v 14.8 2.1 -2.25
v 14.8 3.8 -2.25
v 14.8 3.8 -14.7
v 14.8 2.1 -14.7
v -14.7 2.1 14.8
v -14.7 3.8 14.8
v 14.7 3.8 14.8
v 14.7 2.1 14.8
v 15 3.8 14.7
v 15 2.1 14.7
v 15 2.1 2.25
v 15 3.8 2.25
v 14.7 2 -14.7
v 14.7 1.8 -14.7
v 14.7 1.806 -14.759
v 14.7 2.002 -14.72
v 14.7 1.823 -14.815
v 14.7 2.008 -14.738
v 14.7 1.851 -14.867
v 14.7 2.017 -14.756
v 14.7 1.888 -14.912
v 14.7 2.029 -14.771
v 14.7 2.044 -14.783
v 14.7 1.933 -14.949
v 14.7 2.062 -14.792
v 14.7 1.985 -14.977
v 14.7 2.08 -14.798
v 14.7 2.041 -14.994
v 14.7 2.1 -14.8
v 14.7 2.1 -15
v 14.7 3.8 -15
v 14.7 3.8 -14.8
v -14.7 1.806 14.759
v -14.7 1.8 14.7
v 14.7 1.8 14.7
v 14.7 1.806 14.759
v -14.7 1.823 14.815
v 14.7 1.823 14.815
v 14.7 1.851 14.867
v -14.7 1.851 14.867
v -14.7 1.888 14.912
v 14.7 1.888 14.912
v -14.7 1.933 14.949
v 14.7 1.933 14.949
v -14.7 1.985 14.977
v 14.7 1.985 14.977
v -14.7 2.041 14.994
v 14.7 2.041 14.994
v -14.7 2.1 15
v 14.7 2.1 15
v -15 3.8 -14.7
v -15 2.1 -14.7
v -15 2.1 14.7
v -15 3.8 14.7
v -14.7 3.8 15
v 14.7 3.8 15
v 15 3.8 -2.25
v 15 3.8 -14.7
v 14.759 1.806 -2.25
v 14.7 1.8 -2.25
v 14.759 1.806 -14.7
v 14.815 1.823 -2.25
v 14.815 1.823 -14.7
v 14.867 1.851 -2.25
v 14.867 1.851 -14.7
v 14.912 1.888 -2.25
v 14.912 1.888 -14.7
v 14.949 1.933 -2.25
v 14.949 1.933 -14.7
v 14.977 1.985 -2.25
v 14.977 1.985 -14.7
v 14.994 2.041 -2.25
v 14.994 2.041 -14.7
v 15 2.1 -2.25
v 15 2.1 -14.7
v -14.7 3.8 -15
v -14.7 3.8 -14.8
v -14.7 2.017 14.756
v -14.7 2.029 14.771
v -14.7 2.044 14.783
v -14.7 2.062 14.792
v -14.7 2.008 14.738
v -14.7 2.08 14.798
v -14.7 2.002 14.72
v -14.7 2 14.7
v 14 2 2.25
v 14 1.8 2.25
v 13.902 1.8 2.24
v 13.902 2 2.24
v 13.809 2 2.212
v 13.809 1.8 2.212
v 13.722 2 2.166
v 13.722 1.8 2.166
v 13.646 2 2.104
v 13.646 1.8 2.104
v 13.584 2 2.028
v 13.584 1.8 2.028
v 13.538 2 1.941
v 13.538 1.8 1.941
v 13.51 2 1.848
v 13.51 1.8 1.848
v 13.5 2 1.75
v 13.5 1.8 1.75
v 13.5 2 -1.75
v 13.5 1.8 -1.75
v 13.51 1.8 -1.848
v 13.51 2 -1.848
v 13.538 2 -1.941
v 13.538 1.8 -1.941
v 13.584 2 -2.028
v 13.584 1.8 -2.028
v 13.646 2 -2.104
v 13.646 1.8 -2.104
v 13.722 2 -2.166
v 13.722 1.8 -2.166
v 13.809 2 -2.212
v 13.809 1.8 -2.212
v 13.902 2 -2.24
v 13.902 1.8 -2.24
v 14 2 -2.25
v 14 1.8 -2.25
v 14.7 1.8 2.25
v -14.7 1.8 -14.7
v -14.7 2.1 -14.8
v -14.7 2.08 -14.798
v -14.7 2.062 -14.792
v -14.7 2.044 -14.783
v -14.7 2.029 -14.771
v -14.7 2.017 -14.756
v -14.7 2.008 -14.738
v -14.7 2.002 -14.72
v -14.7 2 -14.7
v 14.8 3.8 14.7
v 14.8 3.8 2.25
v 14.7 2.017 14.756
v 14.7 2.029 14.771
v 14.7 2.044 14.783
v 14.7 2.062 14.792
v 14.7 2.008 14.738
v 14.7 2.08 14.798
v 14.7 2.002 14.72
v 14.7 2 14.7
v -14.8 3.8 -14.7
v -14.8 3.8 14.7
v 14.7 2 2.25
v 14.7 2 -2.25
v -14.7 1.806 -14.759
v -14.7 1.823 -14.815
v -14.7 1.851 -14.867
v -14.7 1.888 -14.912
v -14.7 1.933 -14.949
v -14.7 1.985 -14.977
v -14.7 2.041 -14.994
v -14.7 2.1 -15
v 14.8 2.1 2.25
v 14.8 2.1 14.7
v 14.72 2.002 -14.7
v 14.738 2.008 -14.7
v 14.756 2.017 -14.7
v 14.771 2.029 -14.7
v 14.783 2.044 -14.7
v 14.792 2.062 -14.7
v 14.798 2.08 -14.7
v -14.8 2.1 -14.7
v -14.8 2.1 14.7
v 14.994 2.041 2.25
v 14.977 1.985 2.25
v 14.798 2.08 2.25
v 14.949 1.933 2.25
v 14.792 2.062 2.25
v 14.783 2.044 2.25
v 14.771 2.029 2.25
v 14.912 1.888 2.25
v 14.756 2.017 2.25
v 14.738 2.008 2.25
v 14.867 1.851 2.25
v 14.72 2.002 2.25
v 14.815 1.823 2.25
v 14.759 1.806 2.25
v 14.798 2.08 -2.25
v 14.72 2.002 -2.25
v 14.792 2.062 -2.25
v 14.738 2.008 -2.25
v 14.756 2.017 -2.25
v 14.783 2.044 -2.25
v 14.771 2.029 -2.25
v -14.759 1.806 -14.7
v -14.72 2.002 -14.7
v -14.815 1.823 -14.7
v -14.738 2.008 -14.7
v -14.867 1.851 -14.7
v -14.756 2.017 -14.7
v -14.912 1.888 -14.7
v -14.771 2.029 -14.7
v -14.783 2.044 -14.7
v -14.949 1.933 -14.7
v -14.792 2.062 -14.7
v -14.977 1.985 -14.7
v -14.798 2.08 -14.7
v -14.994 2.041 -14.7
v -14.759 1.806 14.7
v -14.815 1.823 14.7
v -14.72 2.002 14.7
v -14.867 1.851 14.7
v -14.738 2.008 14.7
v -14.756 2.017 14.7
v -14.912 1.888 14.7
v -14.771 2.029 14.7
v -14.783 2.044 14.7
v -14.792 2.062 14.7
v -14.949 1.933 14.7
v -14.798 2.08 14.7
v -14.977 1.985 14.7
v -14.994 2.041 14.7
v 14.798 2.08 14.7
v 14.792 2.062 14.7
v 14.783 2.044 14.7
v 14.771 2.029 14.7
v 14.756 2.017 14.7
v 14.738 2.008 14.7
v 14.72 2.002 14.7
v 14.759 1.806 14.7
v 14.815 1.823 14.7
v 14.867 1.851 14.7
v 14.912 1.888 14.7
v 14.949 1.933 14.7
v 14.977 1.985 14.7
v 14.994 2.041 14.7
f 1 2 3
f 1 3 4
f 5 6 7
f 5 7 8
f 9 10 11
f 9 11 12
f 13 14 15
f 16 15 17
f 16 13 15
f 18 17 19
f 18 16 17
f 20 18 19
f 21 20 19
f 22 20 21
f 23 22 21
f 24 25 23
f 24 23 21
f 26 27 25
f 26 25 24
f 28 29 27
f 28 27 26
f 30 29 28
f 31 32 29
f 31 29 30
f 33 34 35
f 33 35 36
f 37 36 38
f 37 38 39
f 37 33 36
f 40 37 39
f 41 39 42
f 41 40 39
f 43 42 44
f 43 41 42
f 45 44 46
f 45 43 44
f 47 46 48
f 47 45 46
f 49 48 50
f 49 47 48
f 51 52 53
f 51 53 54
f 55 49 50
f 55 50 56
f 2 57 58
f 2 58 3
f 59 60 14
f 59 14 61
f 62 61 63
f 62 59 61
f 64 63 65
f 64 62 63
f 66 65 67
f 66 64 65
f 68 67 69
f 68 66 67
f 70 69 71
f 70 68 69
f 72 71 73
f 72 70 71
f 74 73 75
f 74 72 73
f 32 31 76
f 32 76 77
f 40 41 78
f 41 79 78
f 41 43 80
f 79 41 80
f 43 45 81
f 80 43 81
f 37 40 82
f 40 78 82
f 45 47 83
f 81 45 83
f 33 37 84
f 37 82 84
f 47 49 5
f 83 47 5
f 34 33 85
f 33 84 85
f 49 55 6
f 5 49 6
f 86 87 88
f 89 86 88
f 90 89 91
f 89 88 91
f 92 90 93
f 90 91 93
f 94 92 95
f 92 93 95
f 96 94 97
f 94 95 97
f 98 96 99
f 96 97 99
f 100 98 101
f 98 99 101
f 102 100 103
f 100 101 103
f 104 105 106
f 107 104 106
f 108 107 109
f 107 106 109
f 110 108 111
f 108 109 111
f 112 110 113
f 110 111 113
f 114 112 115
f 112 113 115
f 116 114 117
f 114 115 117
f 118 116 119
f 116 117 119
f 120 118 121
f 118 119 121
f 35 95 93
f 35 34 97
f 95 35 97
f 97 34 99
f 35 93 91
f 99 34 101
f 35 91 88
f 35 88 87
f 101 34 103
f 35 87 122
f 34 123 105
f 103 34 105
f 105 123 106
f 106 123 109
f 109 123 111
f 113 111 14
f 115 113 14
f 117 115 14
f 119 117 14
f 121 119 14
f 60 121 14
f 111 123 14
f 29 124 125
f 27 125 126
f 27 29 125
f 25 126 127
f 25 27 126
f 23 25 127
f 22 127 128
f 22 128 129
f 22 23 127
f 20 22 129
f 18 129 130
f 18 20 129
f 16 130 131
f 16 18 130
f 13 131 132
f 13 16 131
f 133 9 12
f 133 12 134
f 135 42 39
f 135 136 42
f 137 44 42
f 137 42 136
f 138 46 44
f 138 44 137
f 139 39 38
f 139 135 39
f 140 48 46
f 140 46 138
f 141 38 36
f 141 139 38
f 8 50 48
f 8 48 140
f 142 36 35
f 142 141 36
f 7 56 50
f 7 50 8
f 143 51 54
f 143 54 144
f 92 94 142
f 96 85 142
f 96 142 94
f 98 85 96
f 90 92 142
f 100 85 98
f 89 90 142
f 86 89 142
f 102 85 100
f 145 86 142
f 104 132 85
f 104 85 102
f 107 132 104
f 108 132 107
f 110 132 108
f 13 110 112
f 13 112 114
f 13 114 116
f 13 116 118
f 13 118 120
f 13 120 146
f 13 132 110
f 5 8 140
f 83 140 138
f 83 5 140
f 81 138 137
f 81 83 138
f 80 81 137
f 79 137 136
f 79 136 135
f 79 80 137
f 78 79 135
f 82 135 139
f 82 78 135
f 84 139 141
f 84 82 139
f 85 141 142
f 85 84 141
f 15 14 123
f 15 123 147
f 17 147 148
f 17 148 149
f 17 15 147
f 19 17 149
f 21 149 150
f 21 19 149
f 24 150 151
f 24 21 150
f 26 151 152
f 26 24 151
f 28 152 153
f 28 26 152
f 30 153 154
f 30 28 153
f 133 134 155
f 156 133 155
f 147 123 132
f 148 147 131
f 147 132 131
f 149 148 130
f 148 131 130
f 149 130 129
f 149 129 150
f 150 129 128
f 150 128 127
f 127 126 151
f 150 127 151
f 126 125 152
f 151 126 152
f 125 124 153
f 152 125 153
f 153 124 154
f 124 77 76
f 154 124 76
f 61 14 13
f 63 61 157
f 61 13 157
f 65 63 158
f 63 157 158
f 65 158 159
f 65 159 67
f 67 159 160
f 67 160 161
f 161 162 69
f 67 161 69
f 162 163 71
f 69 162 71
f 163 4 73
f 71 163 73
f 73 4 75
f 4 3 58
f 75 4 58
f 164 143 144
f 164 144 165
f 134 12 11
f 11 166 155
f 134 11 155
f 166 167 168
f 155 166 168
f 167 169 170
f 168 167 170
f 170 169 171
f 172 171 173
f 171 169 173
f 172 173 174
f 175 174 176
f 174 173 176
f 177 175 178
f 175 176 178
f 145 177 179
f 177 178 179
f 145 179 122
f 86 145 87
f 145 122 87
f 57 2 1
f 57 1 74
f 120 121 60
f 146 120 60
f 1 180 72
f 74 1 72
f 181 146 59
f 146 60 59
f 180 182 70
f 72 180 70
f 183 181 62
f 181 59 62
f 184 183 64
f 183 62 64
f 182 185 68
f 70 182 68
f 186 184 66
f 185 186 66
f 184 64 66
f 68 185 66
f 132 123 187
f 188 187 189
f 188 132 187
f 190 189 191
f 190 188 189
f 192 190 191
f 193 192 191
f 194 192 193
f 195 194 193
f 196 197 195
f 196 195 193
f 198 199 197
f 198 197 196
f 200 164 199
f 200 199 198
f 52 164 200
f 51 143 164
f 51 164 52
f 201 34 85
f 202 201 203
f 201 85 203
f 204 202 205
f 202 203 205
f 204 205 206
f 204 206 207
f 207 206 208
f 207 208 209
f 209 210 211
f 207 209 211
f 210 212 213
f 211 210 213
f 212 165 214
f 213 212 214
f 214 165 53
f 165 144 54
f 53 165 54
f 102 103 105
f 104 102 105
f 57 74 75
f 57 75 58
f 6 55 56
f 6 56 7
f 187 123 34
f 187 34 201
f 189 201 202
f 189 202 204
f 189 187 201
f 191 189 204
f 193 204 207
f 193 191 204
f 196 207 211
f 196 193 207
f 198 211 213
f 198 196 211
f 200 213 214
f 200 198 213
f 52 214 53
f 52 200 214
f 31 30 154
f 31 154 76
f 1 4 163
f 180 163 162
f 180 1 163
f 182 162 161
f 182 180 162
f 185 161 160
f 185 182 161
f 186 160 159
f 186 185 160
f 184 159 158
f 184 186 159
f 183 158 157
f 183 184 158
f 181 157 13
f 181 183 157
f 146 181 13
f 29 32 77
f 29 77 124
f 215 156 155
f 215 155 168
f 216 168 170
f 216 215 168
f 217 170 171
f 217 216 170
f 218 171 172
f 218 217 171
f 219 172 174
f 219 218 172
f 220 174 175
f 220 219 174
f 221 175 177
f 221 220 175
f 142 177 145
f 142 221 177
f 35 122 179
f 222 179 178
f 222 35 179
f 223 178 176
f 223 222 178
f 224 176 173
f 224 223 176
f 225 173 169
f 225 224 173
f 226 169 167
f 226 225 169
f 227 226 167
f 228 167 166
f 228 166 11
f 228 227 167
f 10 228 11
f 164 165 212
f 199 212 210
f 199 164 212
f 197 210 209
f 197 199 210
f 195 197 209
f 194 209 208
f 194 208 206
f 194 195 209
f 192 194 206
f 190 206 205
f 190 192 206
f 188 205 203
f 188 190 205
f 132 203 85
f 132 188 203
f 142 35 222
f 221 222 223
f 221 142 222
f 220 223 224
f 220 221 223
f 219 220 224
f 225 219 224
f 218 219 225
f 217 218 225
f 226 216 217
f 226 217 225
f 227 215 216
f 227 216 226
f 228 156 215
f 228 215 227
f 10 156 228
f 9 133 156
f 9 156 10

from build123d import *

# Parameters (mm, degrees)
BASES_W            = 29.4
BASES_H            = 29.4
BASE_DEPTH         = 0.2
EDGE_FLANGE1_DEPTH = 29.4
EDGE_FLANGE2_DEPTH = 29.4
EDGE_FLANGE3_DEPTH = 29.4
EDGE_FLANGE4_DEPTH = 29.4
VENT_DEPTH         = 42.363026969
VENT_DEPTH_BACK    = 42.363026969


# Sheet-metal steps are written as plain solids
with BuildPart() as part:
    # BaseS → Base (new body)
    with BuildSketch(Plane(origin=(0, 2, 0), x_dir=(1, 0, 0), z_dir=(0, 1, 0))):
        Rectangle(BASES_W, BASES_H)
    extrude(amount=-BASE_DEPTH)

    # Edge-Flange1 section (across the edge) → Edge-Flange1 (add)
    with BuildSketch(Plane(origin=(-14.7, 2, 14.8), x_dir=(0, 0, -1), z_dir=(1, 0, 0))):
        with BuildLine():
            Line((-0.2, 0.1), (-0.2, 1.8))
            Line((-0.2, 1.8), (0, 1.8))
            Line((0, 1.8), (0, 0.1))
            ThreePointArc((0, 0.1), (0.029289322, 0.029289322), (0.1, 0))
            Line((0.1, 0), (0.1, -0.2))
            ThreePointArc((0.1, -0.2), (-0.112132034, -0.112132034), (-0.2, 0.1))
        make_face()
    extrude(amount=EDGE_FLANGE1_DEPTH)

    # Edge-Flange2 section (across the edge) → Edge-Flange2 (add)
    with BuildSketch(Plane(origin=(14.7, 2, -14.8), x_dir=(0, 0, 1), z_dir=(-1, 0, 0))):
        with BuildLine():
            Line((-0.2, 0.1), (-0.2, 1.8))
            Line((-0.2, 1.8), (0, 1.8))
            Line((0, 1.8), (0, 0.1))
            ThreePointArc((0, 0.1), (0.029289322, 0.029289322), (0.1, 0))
            Line((0.1, 0), (0.1, -0.2))
            ThreePointArc((0.1, -0.2), (-0.112132034, -0.112132034), (-0.2, 0.1))
        make_face()
    extrude(amount=EDGE_FLANGE2_DEPTH)

    # Edge-Flange3 section (across the edge) → Edge-Flange3 (add)
    with BuildSketch(Plane(origin=(14.8, 2, 14.7), x_dir=(-1, 0, 0), z_dir=(0, 0, -1))):
        with BuildLine():
            Line((-0.2, 0.1), (-0.2, 1.8))
            Line((-0.2, 1.8), (0, 1.8))
            Line((0, 1.8), (0, 0.1))
            ThreePointArc((0, 0.1), (0.029289322, 0.029289322), (0.1, 0))
            Line((0.1, 0), (0.1, -0.2))
            ThreePointArc((0.1, -0.2), (-0.112132034, -0.112132034), (-0.2, 0.1))
        make_face()
    extrude(amount=EDGE_FLANGE3_DEPTH)

    # Edge-Flange4 section (across the edge) → Edge-Flange4 (add)
    with BuildSketch(Plane(origin=(-14.8, 2, -14.7), x_dir=(1, 0, 0), z_dir=(0, 0, 1))):
        with BuildLine():
            Line((-0.2, 0.1), (-0.2, 1.8))
            Line((-0.2, 1.8), (0, 1.8))
            Line((0, 1.8), (0, 0.1))
            ThreePointArc((0, 0.1), (0.029289322, 0.029289322), (0.1, 0))
            Line((0.1, 0), (0.1, -0.2))
            ThreePointArc((0.1, -0.2), (-0.112132034, -0.112132034), (-0.2, 0.1))
        make_face()
    extrude(amount=EDGE_FLANGE4_DEPTH)

    # VentS → Vent (cut, two sides: drawn at the far end of the back side and taken through both)
    with BuildSketch(Plane(origin=(-15.1, 1.8, -13.3), x_dir=(1, 0, 0), z_dir=(0, 1, 0)).offset(-VENT_DEPTH_BACK)):
        with BuildLine():
            Line((30.1, -11.05), (30.1, -15.55))
            Line((30.1, -15.55), (29.1, -15.55))
            ThreePointArc((29.1, -15.55), (28.746446609, -15.403553391), (28.6, -15.05))
            Line((28.6, -15.05), (28.6, -11.55))
            ThreePointArc((28.6, -11.55), (28.746446609, -11.196446609), (29.1, -11.05))
            Line((29.1, -11.05), (30.1, -11.05))
        make_face()
    extrude(amount=VENT_DEPTH + VENT_DEPTH_BACK, mode=Mode.SUBTRACT)


solid = part.part
